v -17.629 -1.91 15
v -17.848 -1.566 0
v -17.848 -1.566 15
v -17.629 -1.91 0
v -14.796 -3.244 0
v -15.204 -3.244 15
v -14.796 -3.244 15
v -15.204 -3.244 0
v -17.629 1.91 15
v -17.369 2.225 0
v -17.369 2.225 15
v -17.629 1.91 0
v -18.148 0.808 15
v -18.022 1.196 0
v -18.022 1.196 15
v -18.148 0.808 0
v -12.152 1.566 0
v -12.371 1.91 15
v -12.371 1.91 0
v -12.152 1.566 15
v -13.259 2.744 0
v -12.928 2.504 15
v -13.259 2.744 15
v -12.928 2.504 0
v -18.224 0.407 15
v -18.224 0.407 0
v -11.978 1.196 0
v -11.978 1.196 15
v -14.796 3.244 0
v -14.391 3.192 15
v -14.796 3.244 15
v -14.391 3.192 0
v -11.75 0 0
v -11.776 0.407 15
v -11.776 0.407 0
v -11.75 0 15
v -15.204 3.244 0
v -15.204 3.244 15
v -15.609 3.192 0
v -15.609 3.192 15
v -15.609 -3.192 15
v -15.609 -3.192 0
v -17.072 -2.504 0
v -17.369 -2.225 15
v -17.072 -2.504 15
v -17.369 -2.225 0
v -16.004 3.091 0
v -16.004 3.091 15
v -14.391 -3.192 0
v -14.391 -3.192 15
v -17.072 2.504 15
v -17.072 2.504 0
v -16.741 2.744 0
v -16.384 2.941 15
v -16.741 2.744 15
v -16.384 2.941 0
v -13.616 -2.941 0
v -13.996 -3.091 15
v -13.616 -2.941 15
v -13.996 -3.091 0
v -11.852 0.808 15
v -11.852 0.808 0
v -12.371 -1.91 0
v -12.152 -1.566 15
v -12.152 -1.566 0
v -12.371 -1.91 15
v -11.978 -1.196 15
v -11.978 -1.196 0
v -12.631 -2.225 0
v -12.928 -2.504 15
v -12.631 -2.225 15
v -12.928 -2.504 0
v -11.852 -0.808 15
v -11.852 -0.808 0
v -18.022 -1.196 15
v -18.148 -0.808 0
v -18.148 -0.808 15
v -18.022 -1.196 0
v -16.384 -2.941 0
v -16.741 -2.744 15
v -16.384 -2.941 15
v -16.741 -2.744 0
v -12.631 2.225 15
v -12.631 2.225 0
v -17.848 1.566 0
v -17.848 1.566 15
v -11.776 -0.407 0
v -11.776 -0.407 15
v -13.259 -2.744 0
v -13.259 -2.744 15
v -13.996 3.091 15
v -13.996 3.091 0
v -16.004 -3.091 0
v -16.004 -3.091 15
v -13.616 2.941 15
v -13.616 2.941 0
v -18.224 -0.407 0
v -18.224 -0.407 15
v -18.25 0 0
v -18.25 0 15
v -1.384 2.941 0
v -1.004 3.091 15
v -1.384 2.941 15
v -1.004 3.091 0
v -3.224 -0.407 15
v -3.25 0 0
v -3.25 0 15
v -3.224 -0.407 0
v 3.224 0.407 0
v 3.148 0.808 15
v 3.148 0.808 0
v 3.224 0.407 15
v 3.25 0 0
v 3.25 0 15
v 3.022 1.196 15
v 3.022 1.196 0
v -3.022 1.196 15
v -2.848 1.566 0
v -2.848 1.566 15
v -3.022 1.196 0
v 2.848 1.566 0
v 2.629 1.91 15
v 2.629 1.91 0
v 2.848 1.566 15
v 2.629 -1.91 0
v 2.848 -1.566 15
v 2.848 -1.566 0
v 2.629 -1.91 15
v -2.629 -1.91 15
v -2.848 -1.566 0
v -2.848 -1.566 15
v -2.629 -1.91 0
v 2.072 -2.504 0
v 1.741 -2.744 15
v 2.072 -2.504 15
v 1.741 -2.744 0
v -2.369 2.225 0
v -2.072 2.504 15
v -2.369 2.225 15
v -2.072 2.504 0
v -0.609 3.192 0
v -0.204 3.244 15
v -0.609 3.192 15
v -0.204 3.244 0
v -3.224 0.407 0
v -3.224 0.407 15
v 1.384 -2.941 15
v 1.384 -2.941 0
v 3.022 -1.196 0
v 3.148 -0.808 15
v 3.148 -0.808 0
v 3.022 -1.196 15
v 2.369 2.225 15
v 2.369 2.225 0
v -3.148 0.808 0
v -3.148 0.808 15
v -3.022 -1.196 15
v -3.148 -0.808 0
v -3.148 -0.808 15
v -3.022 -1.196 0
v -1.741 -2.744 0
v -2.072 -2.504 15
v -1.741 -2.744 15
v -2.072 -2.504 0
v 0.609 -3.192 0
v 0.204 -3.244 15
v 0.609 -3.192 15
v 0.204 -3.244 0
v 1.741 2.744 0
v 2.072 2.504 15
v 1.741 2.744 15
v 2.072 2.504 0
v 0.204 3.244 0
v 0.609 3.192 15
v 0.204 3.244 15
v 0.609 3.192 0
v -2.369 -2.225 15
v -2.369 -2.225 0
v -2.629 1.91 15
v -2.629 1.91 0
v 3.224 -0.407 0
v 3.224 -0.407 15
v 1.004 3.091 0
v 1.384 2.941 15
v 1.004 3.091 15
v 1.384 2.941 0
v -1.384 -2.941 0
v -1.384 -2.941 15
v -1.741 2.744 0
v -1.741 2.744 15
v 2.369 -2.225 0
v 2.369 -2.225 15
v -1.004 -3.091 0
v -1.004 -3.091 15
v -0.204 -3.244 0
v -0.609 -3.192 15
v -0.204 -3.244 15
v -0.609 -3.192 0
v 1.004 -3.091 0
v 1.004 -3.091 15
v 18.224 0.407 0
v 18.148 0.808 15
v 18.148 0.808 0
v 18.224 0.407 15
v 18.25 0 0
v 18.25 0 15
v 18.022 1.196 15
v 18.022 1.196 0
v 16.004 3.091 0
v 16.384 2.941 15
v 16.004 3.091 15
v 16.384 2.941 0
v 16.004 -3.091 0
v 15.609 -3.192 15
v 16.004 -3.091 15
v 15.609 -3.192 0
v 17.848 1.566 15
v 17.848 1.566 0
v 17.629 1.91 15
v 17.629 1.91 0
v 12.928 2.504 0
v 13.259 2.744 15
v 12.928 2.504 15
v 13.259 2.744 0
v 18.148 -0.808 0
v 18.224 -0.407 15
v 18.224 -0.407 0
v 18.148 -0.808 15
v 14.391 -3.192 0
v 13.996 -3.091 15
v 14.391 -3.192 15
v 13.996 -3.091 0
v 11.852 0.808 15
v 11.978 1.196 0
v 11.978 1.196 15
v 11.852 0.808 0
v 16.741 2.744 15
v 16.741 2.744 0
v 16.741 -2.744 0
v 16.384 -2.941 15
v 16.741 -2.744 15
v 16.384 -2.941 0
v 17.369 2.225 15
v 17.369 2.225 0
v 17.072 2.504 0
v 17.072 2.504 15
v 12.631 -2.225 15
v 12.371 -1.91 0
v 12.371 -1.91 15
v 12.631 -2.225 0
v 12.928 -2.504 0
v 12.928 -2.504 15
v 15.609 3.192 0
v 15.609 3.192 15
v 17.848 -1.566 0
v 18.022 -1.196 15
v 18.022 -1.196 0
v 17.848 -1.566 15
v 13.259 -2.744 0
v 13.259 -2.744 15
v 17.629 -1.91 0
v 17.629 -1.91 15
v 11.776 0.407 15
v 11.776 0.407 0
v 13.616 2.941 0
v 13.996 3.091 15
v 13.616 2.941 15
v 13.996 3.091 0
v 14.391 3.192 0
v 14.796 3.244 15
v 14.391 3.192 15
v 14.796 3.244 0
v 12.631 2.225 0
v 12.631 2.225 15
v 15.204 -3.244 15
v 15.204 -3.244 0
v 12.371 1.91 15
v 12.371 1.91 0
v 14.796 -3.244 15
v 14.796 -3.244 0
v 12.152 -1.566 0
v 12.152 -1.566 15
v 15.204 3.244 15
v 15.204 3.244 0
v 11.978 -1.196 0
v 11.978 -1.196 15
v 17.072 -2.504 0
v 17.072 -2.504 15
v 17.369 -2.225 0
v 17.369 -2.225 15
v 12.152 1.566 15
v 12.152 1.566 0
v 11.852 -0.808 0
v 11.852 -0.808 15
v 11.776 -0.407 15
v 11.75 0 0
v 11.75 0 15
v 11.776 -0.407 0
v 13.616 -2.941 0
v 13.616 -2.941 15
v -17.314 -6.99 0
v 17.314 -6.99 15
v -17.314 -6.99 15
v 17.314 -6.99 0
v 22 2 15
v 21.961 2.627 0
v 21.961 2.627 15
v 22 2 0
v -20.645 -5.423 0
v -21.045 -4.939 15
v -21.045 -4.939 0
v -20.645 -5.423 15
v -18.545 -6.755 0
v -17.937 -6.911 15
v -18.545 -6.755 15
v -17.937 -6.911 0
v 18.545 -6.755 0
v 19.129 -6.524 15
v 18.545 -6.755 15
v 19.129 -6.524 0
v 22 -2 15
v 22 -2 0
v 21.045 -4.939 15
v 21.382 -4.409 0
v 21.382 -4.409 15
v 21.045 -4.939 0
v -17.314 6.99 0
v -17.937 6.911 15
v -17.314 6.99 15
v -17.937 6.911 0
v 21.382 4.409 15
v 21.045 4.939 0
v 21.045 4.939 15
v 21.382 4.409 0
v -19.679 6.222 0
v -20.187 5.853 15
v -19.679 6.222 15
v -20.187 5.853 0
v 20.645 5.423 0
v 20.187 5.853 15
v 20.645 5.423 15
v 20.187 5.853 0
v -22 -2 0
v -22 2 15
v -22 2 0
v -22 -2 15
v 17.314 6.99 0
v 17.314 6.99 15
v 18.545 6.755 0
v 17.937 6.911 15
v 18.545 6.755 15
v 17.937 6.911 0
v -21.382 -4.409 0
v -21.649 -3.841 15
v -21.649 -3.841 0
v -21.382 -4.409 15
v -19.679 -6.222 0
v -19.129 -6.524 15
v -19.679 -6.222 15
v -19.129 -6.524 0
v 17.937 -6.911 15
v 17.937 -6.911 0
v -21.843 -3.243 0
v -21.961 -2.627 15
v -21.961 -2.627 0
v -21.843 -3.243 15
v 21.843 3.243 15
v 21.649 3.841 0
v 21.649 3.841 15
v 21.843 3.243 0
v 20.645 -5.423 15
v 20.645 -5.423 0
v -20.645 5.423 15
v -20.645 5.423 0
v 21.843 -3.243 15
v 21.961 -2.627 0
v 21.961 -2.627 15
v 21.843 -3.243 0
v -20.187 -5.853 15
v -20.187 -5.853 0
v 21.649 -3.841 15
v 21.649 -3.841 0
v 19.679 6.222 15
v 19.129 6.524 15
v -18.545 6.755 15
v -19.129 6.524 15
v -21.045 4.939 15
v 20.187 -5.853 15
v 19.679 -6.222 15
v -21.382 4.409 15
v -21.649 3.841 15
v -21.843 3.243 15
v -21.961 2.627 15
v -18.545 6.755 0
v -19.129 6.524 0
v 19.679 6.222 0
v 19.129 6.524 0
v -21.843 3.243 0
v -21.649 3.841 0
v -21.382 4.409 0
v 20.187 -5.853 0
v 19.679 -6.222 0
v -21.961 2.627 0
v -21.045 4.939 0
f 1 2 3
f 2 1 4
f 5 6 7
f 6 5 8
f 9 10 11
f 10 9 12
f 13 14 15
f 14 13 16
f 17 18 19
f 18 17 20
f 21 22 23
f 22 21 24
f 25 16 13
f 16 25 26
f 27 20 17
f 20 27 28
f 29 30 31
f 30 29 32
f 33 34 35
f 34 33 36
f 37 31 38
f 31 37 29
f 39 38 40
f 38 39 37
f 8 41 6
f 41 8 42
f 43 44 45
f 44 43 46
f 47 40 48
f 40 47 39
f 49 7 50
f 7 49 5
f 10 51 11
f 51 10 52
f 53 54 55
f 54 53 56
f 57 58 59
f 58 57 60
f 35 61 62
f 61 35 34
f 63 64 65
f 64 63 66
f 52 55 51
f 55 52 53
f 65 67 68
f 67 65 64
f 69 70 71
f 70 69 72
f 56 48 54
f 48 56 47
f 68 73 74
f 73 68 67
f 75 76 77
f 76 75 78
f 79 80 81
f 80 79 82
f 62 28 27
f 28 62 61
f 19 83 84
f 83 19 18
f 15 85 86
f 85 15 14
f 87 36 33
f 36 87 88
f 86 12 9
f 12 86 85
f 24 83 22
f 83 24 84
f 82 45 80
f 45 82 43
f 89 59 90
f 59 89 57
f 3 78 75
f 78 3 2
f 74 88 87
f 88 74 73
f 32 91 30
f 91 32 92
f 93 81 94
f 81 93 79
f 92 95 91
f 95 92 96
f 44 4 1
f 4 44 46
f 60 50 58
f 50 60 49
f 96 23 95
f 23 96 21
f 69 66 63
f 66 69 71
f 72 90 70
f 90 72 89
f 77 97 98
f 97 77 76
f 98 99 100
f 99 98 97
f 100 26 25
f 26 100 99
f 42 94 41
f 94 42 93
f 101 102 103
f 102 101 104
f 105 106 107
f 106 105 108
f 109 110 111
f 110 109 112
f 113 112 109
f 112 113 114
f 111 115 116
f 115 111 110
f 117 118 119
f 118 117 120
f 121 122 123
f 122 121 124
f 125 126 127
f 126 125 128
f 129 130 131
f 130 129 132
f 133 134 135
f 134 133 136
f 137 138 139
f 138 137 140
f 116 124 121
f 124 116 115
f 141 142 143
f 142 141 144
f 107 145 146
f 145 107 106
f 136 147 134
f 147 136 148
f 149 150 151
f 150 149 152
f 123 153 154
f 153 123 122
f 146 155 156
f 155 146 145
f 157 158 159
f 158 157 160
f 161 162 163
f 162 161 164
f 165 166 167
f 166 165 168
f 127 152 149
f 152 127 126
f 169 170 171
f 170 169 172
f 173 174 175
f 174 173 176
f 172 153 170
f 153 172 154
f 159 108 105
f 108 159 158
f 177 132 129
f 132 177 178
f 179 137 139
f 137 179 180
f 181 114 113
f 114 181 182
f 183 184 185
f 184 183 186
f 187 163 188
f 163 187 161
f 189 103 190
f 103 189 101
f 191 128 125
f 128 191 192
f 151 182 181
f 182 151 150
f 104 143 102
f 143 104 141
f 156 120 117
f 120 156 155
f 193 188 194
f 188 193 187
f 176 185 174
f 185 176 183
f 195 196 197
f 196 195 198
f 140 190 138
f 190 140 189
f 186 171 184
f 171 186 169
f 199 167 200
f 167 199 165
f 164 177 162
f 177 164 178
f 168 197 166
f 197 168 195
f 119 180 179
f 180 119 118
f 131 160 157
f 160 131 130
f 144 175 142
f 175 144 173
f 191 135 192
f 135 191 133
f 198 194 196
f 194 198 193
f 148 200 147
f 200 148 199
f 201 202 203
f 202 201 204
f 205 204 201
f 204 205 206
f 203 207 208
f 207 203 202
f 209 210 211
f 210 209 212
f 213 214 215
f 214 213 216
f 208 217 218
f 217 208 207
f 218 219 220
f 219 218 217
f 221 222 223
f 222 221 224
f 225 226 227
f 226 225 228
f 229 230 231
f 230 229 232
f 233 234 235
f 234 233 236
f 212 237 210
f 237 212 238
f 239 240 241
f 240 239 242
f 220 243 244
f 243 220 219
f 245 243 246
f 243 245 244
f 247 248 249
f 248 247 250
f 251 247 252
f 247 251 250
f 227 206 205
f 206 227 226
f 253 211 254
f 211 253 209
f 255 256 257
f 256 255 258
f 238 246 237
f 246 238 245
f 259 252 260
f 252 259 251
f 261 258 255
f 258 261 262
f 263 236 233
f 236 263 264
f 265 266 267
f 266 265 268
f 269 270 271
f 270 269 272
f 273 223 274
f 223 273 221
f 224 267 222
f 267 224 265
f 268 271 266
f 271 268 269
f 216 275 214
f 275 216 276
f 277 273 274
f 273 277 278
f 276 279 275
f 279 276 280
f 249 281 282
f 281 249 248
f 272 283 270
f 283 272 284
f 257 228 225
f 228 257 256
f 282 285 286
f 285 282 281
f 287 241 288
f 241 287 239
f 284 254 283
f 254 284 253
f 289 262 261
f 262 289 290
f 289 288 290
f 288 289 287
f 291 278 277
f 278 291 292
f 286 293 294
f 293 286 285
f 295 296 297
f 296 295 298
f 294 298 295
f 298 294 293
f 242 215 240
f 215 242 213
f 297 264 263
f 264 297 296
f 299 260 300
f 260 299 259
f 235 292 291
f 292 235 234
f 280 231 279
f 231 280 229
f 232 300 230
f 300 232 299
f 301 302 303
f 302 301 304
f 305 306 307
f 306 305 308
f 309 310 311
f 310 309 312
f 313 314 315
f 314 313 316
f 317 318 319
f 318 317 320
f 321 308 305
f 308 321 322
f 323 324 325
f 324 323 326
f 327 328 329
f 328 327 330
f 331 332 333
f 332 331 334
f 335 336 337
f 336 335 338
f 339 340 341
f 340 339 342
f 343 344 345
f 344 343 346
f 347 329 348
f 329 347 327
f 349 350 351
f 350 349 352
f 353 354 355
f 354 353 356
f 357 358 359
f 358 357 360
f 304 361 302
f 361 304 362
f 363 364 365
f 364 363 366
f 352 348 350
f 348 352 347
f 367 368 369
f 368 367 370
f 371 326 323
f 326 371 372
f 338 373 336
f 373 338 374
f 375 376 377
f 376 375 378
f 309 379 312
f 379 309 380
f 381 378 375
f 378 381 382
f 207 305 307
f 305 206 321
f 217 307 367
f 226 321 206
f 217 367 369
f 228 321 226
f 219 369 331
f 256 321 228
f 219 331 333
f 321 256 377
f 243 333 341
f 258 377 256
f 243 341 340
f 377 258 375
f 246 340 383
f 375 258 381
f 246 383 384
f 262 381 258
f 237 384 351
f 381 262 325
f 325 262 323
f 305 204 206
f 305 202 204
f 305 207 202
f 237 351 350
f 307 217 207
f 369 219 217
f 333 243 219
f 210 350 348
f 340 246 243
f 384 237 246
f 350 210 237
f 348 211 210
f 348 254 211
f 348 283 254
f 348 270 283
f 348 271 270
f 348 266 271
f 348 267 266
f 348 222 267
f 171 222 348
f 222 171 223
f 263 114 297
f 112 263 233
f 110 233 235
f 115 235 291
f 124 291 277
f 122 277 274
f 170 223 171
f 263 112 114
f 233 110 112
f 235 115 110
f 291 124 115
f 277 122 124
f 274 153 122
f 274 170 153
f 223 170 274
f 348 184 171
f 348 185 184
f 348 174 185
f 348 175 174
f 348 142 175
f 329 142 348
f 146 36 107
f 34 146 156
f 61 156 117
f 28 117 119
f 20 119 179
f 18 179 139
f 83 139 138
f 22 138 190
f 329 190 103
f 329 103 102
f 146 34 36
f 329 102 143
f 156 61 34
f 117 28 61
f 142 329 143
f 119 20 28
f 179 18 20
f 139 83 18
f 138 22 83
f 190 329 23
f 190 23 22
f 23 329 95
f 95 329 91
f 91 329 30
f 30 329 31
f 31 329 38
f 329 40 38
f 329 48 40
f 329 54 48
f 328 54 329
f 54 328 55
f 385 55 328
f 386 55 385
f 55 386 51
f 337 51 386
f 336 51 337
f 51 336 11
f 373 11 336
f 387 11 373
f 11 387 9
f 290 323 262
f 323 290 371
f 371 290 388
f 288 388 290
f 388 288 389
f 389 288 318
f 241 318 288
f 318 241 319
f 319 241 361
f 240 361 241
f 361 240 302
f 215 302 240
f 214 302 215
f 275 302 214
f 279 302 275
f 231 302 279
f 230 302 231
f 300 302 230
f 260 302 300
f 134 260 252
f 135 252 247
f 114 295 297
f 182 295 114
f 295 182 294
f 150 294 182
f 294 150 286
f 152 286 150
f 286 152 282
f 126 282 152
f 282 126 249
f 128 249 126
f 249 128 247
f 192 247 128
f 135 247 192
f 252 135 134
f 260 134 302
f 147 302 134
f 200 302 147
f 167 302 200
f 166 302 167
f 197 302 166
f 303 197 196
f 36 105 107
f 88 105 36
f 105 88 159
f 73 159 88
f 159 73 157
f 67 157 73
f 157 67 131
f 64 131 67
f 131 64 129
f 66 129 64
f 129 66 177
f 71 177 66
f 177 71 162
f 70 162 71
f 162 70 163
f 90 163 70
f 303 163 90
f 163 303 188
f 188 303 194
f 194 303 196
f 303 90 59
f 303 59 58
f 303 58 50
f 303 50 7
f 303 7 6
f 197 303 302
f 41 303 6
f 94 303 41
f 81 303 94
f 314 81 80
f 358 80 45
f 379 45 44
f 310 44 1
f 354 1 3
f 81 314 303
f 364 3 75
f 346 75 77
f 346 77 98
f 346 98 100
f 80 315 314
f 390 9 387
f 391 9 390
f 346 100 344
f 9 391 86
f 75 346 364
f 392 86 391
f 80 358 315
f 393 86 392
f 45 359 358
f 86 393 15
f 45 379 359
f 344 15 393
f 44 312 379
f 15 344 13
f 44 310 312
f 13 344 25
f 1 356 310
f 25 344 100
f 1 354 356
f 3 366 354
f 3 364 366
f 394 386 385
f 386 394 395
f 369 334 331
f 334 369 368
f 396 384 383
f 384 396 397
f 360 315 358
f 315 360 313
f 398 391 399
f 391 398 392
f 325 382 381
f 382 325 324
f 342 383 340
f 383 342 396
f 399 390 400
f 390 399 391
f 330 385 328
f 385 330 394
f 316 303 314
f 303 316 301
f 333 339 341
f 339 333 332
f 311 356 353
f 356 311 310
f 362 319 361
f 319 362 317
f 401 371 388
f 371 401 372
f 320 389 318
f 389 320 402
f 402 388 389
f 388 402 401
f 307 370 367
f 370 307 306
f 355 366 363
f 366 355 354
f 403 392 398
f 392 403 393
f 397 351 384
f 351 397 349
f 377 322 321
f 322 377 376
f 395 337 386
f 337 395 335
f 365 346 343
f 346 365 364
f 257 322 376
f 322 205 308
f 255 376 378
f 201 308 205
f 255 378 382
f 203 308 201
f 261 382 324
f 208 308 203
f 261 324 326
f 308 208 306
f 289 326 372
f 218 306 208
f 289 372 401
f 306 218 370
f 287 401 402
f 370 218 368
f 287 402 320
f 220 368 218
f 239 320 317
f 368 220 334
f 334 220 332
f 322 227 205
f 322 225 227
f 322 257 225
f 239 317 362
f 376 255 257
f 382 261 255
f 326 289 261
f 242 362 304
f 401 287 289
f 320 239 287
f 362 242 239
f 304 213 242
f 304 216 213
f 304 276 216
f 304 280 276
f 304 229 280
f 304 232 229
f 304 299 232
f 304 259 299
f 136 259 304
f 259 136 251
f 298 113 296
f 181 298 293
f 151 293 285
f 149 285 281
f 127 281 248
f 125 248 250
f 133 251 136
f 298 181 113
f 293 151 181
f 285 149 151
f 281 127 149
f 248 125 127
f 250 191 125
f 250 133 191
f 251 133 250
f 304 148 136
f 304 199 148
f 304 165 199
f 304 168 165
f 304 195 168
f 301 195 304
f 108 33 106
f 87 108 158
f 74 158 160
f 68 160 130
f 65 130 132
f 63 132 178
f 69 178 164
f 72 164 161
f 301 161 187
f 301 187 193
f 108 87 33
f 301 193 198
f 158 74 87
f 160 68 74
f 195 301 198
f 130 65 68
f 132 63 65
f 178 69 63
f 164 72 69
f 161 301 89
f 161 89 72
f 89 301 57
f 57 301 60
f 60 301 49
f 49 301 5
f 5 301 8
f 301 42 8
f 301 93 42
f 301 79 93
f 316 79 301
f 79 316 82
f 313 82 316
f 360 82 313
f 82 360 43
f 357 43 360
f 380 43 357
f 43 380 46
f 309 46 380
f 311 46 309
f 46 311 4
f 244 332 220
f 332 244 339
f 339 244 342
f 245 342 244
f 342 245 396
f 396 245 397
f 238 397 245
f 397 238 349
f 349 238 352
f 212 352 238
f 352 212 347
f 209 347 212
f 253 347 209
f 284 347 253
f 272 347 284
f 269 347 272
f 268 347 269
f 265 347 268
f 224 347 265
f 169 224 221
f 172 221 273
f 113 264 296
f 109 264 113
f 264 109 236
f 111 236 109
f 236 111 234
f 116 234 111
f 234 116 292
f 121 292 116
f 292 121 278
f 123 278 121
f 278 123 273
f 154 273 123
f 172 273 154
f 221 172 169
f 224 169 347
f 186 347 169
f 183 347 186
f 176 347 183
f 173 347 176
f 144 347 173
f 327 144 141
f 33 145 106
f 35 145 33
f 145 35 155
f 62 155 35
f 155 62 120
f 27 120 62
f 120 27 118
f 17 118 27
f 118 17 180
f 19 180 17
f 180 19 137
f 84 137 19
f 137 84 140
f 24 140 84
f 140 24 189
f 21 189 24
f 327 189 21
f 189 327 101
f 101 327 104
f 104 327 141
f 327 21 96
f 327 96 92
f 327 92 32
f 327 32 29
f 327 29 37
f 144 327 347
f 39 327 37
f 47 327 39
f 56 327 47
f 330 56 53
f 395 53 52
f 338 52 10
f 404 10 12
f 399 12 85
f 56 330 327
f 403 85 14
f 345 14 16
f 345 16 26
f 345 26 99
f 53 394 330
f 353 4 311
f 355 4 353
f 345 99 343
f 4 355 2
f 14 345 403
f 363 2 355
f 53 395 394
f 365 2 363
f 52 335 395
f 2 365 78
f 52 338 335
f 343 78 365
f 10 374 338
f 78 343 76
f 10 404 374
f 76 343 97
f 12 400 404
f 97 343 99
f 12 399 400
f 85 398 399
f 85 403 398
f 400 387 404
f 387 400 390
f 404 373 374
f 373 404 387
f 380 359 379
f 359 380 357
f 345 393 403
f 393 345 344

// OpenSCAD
$fn = 50;


difference() {
	union() {
		hull() {
			translate(v = [-17.0000000000, 2.0000000000, 0]) {
				cylinder(h = 15, r = 5);
			}
			translate(v = [17.0000000000, 2.0000000000, 0]) {
				cylinder(h = 15, r = 5);
			}
			translate(v = [-17.0000000000, -2.0000000000, 0]) {
				cylinder(h = 15, r = 5);
			}
			translate(v = [17.0000000000, -2.0000000000, 0]) {
				cylinder(h = 15, r = 5);
			}
		}
	}
	union() {
		translate(v = [-15.0000000000, 0.0000000000, -100.0000000000]) {
			cylinder(h = 200, r = 3.2500000000);
		}
		translate(v = [0.0000000000, 0.0000000000, -100.0000000000]) {
			cylinder(h = 200, r = 3.2500000000);
		}
		translate(v = [15.0000000000, 0.0000000000, -100.0000000000]) {
			cylinder(h = 200, r = 3.2500000000);
		}
	}
}
